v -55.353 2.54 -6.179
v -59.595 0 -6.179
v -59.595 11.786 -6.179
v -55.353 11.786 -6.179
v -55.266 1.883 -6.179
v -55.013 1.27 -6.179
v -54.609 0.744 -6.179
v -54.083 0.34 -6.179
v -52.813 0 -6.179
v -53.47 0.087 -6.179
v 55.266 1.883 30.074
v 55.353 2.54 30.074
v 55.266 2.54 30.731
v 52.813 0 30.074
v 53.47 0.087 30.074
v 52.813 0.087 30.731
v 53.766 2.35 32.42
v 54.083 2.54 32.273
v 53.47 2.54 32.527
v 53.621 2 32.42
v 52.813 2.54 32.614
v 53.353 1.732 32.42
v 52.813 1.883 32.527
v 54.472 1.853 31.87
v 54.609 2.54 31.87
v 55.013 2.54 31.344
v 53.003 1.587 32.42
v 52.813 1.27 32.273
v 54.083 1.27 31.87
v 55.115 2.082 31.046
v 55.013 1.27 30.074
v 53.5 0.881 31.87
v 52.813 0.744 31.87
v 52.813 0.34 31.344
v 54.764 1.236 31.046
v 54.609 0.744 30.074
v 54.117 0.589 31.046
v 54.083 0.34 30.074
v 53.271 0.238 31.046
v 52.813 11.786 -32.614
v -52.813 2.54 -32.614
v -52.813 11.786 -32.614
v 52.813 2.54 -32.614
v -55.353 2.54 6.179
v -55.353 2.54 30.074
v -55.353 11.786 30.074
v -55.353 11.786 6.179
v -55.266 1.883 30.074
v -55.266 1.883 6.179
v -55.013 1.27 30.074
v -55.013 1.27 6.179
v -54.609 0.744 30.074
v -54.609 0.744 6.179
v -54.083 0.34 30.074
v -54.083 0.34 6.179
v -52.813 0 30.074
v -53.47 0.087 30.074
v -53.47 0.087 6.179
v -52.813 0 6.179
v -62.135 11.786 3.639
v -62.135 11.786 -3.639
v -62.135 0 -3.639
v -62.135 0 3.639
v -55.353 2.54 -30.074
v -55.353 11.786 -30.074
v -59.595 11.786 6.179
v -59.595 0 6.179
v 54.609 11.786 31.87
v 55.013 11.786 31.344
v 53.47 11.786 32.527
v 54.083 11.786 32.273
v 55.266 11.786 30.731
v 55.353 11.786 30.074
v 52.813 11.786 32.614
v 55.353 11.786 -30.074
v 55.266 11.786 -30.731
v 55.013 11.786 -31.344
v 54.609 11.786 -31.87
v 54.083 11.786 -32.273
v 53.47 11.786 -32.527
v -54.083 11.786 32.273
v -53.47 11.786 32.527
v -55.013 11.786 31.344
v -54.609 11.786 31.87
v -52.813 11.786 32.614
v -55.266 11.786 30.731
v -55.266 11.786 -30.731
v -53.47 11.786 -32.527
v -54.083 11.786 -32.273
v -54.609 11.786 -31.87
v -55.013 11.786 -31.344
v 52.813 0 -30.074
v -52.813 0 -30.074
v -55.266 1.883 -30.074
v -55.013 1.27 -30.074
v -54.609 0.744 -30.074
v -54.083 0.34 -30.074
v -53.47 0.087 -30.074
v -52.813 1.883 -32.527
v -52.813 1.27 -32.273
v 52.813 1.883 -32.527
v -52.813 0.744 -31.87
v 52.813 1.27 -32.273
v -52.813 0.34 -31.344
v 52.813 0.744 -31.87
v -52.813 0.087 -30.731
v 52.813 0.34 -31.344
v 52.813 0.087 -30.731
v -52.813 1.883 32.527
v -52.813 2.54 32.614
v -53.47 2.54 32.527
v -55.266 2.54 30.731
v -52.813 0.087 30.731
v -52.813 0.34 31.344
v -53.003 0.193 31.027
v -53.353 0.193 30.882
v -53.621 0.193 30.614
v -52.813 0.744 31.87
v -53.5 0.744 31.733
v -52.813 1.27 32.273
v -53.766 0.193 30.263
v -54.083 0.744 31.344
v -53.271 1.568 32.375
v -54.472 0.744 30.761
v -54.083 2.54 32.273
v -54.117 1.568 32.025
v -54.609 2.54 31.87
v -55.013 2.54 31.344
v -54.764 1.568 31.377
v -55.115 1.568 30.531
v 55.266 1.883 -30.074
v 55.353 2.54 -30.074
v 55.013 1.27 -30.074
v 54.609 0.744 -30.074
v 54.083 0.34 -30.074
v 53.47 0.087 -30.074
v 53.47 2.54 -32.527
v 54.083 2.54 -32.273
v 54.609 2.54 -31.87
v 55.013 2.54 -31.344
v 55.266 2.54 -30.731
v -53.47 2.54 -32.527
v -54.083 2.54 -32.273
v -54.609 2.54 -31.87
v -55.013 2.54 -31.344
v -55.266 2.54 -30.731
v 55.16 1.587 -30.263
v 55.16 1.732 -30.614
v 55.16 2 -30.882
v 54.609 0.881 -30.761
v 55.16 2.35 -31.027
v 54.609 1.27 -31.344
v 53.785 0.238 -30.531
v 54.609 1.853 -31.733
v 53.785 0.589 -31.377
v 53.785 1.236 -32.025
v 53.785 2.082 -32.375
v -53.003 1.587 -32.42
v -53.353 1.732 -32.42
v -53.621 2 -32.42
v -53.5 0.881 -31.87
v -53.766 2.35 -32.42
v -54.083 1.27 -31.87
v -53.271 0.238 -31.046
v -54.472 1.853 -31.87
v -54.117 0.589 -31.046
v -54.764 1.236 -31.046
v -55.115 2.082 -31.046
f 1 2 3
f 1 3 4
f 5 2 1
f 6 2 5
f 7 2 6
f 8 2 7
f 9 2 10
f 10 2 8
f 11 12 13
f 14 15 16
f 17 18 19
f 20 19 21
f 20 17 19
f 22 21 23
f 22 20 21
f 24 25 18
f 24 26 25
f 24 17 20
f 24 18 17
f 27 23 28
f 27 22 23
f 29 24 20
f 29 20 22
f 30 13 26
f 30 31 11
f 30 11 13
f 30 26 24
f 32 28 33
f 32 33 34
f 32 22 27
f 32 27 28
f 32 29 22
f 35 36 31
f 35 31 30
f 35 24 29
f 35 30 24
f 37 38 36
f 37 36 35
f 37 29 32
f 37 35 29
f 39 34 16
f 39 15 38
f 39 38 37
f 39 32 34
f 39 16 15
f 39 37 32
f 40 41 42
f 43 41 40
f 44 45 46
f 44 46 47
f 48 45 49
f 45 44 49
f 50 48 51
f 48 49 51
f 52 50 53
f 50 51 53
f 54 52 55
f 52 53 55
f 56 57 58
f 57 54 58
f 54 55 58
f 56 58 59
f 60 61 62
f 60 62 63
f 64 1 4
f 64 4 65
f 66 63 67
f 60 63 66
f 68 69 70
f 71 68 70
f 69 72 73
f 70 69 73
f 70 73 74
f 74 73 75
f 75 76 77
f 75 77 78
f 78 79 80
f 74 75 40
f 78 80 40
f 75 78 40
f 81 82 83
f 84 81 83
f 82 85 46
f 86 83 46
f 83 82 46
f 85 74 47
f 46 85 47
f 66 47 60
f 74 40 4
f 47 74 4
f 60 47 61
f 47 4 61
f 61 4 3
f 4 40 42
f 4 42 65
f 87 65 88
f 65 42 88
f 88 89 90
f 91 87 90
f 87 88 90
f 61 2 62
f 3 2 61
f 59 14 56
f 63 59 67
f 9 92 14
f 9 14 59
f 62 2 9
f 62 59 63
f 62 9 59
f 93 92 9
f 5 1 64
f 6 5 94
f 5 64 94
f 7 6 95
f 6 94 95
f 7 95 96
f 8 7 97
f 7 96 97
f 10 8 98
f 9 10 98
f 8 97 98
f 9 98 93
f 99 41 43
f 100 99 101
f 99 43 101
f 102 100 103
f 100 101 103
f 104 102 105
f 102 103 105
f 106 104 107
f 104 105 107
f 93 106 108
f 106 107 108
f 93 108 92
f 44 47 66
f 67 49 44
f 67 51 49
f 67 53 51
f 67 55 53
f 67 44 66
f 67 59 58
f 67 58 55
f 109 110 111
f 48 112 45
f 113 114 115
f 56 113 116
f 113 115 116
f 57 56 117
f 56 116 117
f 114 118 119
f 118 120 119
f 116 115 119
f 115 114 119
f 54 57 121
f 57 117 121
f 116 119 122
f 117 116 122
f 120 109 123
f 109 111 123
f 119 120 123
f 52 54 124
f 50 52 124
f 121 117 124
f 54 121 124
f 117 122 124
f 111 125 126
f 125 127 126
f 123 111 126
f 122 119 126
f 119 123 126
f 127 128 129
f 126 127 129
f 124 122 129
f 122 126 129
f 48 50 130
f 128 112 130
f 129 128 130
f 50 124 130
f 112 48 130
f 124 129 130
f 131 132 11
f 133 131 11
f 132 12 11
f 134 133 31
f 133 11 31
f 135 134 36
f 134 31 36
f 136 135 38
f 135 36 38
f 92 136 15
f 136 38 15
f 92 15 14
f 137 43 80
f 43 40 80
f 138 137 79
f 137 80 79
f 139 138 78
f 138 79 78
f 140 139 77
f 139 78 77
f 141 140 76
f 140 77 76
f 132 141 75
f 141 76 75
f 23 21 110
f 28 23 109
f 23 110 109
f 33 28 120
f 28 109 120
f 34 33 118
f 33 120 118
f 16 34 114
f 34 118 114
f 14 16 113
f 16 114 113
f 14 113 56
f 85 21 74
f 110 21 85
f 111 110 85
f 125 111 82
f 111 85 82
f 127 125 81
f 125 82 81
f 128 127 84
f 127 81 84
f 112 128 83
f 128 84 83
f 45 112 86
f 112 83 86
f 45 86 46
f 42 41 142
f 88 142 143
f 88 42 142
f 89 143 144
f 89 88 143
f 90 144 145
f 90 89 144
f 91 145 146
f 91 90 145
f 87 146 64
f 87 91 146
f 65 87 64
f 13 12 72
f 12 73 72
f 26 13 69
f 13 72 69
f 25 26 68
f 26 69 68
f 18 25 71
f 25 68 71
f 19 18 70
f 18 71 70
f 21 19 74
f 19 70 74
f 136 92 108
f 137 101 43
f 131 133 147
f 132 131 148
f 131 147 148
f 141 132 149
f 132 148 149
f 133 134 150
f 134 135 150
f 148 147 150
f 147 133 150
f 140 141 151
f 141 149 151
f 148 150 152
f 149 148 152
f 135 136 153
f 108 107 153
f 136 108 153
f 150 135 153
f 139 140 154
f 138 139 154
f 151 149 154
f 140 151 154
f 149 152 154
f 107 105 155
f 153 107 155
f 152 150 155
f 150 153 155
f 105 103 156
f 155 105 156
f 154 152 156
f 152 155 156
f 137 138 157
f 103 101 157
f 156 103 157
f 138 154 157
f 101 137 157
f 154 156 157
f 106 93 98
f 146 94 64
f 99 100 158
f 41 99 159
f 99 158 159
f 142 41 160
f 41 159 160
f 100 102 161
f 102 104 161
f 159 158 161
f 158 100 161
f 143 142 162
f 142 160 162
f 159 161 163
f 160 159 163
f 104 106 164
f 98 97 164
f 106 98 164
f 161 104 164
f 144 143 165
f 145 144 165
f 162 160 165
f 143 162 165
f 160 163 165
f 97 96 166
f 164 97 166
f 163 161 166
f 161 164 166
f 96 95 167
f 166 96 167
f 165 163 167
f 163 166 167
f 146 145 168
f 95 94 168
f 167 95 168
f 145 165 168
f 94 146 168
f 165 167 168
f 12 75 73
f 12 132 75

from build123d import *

# Parameters (mm, degrees)
BOSS_EXTRUDE1_DEPTH = 11.7856
FILLET1_R           = 2.54
CHAMFER1_SIZE       = 2.54


with BuildPart() as part:
    # Sketch1 → Boss-Extrude1 (new body)
    with BuildSketch(Plane(origin=(0, 0, 0), x_dir=(1, 0, 0), z_dir=(0, 1, 0))):
        Polygon((-55.35295, 32.6136), (55.35295, 32.6136), (55.35295, -32.6136), (-55.35295, -32.6136), (-55.35295, -6.17855), (-62.13475, -6.17855), (-62.13475, 0), (-62.13475, 6.17855), (-55.35295, 6.17855), align=None)
    extrude(amount=BOSS_EXTRUDE1_DEPTH)

    # Fillet1
    fillet1_edges = [part.edges().sort_by_distance(p)[0] for p in [
        (-55.35295, 0, -19.396075),
        (0, 0, -32.6136),
        (55.35295, 0, 0),
        (55.35295, 5.8928, 32.6136),
        (-55.35295, 5.8928, 32.6136),
        (-55.35295, 5.8928, -32.6136),
        (55.35295, 5.8928, -32.6136),
        (0, 0, 32.6136),
        (-55.35295, 0, 19.396075),
    ]]
    fillet(fillet1_edges, radius=FILLET1_R)

    # Chamfer1
    chamfer1_edges = [part.edges().sort_by_distance(p)[0] for p in [
        (-62.13475, 5.8928, 6.17855),
        (-62.13475, 5.8928, -6.17855),
    ]]
    chamfer(chamfer1_edges, length=CHAMFER1_SIZE)


solid = part.part
